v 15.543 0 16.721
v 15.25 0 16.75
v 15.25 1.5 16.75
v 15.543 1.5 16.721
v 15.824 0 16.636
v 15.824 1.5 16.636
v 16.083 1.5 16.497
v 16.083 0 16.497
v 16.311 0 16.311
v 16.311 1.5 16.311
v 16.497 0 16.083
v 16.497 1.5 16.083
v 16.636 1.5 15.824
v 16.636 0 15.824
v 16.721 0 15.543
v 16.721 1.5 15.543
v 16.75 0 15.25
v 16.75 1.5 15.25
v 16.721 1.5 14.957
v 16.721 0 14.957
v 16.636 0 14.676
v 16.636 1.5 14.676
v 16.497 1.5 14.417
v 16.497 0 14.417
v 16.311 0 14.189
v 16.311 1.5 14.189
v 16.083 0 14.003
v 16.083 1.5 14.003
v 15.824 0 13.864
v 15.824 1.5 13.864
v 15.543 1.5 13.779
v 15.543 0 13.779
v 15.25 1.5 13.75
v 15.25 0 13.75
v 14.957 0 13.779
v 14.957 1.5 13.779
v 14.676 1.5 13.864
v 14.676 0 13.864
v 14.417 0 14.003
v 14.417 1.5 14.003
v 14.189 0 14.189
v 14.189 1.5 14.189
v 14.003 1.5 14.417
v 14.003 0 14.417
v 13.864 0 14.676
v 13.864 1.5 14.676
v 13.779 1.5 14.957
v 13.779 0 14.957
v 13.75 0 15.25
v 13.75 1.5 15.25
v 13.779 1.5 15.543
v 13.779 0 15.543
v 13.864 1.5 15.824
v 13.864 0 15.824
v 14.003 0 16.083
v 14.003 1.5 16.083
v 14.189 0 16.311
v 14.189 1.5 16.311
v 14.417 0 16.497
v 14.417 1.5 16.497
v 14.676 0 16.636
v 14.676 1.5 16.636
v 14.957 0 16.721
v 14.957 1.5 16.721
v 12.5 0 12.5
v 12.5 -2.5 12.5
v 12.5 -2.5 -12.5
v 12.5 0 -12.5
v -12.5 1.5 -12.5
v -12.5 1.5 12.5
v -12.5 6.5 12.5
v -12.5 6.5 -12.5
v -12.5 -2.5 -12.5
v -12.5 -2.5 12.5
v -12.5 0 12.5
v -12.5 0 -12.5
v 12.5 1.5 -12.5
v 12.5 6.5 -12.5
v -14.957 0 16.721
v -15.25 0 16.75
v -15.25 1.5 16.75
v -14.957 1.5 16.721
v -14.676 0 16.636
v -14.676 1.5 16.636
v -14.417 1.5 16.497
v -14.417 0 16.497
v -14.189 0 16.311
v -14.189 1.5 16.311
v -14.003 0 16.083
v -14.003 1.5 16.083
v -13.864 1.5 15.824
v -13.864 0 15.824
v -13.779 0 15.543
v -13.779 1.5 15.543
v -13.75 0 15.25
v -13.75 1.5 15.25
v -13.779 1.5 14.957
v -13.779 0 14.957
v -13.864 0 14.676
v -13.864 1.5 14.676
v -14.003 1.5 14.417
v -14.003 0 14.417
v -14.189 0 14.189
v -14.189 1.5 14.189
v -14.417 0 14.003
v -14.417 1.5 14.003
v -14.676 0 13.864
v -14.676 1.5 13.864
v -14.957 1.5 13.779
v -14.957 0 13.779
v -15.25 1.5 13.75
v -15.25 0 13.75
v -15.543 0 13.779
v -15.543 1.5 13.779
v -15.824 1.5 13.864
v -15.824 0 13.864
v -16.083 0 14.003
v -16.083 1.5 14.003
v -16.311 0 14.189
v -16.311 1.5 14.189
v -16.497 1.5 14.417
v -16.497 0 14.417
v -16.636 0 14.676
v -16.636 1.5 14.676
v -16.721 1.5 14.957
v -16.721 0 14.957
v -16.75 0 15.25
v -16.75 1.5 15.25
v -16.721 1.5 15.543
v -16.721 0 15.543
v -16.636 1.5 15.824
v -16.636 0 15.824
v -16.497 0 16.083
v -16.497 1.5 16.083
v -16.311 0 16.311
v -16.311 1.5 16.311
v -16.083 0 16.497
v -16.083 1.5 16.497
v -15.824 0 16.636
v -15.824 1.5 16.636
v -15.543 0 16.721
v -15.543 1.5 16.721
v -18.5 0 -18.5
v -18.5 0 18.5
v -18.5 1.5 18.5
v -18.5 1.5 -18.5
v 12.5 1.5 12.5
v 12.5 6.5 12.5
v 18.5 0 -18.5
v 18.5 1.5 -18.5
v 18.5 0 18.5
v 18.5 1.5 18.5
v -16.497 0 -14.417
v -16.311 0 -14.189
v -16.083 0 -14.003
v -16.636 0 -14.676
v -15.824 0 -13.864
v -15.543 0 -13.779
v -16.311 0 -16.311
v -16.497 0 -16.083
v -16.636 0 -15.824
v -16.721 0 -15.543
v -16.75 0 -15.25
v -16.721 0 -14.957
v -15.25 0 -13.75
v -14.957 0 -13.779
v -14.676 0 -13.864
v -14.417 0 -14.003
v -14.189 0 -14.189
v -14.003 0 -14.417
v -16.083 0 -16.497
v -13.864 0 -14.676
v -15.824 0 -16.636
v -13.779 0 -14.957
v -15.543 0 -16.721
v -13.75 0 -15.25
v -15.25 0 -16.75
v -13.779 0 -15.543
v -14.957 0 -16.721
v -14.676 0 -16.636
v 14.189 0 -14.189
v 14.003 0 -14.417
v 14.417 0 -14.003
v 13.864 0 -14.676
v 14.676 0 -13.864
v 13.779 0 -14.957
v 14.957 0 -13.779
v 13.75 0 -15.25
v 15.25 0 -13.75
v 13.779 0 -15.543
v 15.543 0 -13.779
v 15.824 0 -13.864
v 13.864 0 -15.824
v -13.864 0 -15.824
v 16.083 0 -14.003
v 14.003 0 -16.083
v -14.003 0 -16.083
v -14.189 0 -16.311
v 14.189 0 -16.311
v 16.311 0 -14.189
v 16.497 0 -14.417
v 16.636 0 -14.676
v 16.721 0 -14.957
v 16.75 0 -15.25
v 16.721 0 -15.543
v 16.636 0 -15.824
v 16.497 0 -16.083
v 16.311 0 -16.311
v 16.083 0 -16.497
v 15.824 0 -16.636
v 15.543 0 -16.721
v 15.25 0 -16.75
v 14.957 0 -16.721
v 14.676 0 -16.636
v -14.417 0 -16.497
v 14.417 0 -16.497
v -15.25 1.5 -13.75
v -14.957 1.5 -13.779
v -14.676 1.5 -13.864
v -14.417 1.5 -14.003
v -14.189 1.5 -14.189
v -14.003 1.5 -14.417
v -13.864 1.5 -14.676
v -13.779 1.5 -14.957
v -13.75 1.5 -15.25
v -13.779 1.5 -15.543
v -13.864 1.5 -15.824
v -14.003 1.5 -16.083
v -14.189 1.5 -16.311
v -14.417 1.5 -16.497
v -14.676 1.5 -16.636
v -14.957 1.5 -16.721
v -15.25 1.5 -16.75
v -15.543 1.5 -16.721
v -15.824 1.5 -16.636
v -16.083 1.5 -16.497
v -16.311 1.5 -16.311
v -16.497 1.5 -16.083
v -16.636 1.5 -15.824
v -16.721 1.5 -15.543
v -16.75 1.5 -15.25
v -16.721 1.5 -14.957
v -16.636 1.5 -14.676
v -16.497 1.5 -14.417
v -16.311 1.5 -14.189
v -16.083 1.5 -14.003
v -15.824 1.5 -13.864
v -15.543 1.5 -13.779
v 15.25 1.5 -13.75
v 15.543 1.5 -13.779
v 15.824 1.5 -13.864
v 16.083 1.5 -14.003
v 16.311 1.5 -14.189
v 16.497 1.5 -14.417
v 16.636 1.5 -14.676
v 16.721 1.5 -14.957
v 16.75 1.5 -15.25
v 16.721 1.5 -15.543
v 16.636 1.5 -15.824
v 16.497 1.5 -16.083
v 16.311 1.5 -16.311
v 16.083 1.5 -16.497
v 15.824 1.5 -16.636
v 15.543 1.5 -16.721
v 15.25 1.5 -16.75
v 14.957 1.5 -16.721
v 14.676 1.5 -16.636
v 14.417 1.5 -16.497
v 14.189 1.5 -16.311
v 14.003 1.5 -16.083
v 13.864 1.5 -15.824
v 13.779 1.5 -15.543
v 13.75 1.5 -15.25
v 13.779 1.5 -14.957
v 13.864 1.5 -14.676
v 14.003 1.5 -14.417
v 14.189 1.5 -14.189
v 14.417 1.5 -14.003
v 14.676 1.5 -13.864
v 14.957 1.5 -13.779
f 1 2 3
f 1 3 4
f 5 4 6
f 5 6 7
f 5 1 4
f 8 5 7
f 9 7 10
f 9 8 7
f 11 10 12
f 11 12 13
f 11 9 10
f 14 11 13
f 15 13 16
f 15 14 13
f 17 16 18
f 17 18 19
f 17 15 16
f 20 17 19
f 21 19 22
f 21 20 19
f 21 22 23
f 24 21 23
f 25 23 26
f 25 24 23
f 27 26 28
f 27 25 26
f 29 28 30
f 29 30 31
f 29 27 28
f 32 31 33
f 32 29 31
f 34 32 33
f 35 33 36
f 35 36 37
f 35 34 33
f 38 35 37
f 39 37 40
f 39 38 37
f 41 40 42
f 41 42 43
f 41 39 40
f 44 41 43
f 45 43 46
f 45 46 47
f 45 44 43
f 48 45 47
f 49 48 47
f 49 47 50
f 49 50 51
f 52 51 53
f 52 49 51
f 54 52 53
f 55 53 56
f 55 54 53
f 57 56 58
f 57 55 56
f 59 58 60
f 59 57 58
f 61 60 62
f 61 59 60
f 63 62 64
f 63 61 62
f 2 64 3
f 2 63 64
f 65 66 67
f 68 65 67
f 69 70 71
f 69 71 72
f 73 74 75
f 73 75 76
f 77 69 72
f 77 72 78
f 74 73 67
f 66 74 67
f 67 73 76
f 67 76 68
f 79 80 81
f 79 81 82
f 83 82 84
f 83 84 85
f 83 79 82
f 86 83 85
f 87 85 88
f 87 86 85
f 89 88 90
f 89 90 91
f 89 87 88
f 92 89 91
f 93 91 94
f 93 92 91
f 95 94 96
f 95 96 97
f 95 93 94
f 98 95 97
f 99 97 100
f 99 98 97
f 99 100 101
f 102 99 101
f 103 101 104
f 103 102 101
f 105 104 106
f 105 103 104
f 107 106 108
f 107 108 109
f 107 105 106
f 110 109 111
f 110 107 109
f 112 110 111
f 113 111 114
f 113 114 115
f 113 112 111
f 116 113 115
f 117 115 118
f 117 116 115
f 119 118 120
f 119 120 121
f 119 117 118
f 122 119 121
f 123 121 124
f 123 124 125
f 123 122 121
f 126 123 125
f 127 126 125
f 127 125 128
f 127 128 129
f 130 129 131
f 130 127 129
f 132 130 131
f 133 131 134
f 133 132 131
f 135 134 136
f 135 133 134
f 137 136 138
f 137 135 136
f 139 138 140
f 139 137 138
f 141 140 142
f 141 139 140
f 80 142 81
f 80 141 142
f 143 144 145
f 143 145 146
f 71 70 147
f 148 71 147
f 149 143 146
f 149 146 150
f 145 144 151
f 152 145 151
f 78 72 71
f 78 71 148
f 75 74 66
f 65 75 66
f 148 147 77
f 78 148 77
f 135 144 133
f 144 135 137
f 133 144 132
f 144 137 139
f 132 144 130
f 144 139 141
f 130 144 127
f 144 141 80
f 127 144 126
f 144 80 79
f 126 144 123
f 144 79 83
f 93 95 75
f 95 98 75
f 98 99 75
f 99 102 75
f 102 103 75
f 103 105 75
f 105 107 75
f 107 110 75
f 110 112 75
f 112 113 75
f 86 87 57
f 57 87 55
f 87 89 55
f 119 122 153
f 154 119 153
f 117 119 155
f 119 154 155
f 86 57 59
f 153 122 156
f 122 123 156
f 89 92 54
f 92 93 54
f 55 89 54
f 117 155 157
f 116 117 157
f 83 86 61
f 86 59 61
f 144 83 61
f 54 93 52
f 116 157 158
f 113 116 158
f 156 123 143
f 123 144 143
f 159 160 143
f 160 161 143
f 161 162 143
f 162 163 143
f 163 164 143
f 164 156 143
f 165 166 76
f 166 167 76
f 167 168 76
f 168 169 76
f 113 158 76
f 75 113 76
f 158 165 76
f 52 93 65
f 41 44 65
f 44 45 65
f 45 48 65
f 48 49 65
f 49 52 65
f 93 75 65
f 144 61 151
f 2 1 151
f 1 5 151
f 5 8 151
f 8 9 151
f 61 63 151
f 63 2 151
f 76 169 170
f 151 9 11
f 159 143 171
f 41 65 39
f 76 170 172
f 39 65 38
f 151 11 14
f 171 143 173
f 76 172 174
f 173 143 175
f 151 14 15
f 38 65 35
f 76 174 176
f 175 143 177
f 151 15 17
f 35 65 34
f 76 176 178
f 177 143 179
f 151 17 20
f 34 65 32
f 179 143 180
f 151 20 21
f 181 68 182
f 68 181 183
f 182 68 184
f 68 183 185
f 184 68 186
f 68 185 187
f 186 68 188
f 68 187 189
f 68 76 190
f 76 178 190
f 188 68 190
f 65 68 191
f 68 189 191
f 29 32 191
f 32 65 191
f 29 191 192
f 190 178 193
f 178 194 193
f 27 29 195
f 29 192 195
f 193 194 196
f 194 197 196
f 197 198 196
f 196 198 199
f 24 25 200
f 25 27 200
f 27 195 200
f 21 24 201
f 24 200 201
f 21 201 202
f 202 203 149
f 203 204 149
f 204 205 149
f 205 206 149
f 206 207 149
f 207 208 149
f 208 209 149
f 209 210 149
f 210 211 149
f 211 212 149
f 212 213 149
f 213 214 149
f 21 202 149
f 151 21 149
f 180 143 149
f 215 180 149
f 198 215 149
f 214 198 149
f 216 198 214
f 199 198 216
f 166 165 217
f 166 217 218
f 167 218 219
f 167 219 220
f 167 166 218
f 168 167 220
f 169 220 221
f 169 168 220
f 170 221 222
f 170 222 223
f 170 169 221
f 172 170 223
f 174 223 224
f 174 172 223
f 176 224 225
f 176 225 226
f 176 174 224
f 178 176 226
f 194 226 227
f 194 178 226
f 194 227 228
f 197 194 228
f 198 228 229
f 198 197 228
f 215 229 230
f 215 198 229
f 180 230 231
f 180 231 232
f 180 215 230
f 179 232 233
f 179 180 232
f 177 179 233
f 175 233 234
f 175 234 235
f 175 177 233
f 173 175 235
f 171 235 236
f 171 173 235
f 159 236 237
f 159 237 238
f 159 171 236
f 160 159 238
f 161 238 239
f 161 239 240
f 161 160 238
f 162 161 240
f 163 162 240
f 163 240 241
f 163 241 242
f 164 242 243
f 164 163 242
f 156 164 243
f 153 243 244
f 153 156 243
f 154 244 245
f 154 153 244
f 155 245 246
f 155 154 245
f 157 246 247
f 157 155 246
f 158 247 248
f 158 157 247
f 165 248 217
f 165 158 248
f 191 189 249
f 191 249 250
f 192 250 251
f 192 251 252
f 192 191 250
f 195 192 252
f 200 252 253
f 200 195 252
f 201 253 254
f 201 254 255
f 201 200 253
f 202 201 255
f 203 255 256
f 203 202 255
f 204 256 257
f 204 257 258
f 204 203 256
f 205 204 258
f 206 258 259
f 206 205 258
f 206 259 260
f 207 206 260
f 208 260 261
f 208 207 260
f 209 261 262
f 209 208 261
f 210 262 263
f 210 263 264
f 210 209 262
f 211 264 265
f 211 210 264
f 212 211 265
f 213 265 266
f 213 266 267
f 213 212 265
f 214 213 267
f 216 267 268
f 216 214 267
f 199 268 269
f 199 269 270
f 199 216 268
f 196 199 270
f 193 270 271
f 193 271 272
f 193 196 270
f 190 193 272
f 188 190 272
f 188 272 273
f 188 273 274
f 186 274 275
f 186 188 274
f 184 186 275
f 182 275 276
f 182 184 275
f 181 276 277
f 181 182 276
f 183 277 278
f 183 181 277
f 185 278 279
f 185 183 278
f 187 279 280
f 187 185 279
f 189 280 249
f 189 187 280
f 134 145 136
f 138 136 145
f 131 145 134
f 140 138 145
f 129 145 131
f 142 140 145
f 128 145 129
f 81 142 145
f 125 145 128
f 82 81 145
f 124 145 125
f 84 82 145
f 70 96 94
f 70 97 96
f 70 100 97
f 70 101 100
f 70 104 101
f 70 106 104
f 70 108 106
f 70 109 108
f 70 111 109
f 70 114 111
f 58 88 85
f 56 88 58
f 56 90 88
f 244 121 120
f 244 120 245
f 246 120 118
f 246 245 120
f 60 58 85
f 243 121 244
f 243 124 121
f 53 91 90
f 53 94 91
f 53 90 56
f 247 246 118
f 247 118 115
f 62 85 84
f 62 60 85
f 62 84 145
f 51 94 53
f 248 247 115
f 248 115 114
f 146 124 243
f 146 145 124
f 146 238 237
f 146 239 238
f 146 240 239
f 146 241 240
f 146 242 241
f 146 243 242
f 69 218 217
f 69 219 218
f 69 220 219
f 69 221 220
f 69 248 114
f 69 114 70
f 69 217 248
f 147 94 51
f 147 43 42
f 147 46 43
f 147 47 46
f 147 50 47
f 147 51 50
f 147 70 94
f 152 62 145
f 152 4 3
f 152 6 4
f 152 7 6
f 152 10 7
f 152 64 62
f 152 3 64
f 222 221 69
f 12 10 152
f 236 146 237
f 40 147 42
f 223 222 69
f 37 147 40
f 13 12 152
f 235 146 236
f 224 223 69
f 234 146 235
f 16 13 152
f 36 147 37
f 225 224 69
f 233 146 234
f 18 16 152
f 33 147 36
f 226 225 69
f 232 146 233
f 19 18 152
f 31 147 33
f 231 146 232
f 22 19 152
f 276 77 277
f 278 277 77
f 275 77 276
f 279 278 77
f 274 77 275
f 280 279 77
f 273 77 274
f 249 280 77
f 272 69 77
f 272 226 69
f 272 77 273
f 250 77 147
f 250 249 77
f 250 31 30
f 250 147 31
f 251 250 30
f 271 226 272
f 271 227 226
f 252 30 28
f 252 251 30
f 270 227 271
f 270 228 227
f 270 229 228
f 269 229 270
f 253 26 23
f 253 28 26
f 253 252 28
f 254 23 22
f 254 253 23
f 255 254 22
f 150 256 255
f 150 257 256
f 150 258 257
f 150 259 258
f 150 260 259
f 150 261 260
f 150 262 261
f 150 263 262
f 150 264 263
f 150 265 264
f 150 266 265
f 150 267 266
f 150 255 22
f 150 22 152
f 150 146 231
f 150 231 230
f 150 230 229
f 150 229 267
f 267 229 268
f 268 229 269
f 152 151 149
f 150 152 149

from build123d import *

# Parameters (mm, degrees)
SKETCH_1_W           = 37
SKETCH_1_H           = 37
SKETCH_1_R           = 1.5
EXTRUDE_1_DEPTH      = 1.5
EXTRUDE_2_DEPTH      = 5
EXTRUDE_2_DEPTH_BACK = 4
SKETCH_2_W           = 25
SKETCH_2_H           = 25


with BuildPart() as part:
    # 草图1 → 凸台-拉伸1 (new body)
    with BuildSketch(Plane(origin=(0, 0, 0), x_dir=(1, 0, 0), z_dir=(0, 1, 0))):
        Rectangle(SKETCH_1_W, SKETCH_1_H)
        with Locations(Location((-15.25, 15.25, 0), (0, 0, 270))):
            Circle(SKETCH_1_R, mode=Mode.SUBTRACT)
        with Locations(Location((15.25, 15.25, 0), (0, 0, 270))):
            Circle(SKETCH_1_R, mode=Mode.SUBTRACT)
        with Locations(Location((15.25, -15.25, 0), (0, 0, 270))):
            Circle(SKETCH_1_R, mode=Mode.SUBTRACT)
        with Locations(Location((-15.25, -15.25, 0), (0, 0, 270))):
            Circle(SKETCH_1_R, mode=Mode.SUBTRACT)
    extrude(amount=EXTRUDE_1_DEPTH)

    # 草图2 → 凸台-拉伸2 (add, two sides: drawn at the far end of the back side and taken through both)
    with BuildSketch(Plane(origin=(0, 1.5, 0), x_dir=(1, 0, 0), z_dir=(0, 1, 0)).offset(-EXTRUDE_2_DEPTH_BACK)):
        Rectangle(SKETCH_2_W, SKETCH_2_H)
    extrude(amount=EXTRUDE_2_DEPTH + EXTRUDE_2_DEPTH_BACK)


solid = part.part
